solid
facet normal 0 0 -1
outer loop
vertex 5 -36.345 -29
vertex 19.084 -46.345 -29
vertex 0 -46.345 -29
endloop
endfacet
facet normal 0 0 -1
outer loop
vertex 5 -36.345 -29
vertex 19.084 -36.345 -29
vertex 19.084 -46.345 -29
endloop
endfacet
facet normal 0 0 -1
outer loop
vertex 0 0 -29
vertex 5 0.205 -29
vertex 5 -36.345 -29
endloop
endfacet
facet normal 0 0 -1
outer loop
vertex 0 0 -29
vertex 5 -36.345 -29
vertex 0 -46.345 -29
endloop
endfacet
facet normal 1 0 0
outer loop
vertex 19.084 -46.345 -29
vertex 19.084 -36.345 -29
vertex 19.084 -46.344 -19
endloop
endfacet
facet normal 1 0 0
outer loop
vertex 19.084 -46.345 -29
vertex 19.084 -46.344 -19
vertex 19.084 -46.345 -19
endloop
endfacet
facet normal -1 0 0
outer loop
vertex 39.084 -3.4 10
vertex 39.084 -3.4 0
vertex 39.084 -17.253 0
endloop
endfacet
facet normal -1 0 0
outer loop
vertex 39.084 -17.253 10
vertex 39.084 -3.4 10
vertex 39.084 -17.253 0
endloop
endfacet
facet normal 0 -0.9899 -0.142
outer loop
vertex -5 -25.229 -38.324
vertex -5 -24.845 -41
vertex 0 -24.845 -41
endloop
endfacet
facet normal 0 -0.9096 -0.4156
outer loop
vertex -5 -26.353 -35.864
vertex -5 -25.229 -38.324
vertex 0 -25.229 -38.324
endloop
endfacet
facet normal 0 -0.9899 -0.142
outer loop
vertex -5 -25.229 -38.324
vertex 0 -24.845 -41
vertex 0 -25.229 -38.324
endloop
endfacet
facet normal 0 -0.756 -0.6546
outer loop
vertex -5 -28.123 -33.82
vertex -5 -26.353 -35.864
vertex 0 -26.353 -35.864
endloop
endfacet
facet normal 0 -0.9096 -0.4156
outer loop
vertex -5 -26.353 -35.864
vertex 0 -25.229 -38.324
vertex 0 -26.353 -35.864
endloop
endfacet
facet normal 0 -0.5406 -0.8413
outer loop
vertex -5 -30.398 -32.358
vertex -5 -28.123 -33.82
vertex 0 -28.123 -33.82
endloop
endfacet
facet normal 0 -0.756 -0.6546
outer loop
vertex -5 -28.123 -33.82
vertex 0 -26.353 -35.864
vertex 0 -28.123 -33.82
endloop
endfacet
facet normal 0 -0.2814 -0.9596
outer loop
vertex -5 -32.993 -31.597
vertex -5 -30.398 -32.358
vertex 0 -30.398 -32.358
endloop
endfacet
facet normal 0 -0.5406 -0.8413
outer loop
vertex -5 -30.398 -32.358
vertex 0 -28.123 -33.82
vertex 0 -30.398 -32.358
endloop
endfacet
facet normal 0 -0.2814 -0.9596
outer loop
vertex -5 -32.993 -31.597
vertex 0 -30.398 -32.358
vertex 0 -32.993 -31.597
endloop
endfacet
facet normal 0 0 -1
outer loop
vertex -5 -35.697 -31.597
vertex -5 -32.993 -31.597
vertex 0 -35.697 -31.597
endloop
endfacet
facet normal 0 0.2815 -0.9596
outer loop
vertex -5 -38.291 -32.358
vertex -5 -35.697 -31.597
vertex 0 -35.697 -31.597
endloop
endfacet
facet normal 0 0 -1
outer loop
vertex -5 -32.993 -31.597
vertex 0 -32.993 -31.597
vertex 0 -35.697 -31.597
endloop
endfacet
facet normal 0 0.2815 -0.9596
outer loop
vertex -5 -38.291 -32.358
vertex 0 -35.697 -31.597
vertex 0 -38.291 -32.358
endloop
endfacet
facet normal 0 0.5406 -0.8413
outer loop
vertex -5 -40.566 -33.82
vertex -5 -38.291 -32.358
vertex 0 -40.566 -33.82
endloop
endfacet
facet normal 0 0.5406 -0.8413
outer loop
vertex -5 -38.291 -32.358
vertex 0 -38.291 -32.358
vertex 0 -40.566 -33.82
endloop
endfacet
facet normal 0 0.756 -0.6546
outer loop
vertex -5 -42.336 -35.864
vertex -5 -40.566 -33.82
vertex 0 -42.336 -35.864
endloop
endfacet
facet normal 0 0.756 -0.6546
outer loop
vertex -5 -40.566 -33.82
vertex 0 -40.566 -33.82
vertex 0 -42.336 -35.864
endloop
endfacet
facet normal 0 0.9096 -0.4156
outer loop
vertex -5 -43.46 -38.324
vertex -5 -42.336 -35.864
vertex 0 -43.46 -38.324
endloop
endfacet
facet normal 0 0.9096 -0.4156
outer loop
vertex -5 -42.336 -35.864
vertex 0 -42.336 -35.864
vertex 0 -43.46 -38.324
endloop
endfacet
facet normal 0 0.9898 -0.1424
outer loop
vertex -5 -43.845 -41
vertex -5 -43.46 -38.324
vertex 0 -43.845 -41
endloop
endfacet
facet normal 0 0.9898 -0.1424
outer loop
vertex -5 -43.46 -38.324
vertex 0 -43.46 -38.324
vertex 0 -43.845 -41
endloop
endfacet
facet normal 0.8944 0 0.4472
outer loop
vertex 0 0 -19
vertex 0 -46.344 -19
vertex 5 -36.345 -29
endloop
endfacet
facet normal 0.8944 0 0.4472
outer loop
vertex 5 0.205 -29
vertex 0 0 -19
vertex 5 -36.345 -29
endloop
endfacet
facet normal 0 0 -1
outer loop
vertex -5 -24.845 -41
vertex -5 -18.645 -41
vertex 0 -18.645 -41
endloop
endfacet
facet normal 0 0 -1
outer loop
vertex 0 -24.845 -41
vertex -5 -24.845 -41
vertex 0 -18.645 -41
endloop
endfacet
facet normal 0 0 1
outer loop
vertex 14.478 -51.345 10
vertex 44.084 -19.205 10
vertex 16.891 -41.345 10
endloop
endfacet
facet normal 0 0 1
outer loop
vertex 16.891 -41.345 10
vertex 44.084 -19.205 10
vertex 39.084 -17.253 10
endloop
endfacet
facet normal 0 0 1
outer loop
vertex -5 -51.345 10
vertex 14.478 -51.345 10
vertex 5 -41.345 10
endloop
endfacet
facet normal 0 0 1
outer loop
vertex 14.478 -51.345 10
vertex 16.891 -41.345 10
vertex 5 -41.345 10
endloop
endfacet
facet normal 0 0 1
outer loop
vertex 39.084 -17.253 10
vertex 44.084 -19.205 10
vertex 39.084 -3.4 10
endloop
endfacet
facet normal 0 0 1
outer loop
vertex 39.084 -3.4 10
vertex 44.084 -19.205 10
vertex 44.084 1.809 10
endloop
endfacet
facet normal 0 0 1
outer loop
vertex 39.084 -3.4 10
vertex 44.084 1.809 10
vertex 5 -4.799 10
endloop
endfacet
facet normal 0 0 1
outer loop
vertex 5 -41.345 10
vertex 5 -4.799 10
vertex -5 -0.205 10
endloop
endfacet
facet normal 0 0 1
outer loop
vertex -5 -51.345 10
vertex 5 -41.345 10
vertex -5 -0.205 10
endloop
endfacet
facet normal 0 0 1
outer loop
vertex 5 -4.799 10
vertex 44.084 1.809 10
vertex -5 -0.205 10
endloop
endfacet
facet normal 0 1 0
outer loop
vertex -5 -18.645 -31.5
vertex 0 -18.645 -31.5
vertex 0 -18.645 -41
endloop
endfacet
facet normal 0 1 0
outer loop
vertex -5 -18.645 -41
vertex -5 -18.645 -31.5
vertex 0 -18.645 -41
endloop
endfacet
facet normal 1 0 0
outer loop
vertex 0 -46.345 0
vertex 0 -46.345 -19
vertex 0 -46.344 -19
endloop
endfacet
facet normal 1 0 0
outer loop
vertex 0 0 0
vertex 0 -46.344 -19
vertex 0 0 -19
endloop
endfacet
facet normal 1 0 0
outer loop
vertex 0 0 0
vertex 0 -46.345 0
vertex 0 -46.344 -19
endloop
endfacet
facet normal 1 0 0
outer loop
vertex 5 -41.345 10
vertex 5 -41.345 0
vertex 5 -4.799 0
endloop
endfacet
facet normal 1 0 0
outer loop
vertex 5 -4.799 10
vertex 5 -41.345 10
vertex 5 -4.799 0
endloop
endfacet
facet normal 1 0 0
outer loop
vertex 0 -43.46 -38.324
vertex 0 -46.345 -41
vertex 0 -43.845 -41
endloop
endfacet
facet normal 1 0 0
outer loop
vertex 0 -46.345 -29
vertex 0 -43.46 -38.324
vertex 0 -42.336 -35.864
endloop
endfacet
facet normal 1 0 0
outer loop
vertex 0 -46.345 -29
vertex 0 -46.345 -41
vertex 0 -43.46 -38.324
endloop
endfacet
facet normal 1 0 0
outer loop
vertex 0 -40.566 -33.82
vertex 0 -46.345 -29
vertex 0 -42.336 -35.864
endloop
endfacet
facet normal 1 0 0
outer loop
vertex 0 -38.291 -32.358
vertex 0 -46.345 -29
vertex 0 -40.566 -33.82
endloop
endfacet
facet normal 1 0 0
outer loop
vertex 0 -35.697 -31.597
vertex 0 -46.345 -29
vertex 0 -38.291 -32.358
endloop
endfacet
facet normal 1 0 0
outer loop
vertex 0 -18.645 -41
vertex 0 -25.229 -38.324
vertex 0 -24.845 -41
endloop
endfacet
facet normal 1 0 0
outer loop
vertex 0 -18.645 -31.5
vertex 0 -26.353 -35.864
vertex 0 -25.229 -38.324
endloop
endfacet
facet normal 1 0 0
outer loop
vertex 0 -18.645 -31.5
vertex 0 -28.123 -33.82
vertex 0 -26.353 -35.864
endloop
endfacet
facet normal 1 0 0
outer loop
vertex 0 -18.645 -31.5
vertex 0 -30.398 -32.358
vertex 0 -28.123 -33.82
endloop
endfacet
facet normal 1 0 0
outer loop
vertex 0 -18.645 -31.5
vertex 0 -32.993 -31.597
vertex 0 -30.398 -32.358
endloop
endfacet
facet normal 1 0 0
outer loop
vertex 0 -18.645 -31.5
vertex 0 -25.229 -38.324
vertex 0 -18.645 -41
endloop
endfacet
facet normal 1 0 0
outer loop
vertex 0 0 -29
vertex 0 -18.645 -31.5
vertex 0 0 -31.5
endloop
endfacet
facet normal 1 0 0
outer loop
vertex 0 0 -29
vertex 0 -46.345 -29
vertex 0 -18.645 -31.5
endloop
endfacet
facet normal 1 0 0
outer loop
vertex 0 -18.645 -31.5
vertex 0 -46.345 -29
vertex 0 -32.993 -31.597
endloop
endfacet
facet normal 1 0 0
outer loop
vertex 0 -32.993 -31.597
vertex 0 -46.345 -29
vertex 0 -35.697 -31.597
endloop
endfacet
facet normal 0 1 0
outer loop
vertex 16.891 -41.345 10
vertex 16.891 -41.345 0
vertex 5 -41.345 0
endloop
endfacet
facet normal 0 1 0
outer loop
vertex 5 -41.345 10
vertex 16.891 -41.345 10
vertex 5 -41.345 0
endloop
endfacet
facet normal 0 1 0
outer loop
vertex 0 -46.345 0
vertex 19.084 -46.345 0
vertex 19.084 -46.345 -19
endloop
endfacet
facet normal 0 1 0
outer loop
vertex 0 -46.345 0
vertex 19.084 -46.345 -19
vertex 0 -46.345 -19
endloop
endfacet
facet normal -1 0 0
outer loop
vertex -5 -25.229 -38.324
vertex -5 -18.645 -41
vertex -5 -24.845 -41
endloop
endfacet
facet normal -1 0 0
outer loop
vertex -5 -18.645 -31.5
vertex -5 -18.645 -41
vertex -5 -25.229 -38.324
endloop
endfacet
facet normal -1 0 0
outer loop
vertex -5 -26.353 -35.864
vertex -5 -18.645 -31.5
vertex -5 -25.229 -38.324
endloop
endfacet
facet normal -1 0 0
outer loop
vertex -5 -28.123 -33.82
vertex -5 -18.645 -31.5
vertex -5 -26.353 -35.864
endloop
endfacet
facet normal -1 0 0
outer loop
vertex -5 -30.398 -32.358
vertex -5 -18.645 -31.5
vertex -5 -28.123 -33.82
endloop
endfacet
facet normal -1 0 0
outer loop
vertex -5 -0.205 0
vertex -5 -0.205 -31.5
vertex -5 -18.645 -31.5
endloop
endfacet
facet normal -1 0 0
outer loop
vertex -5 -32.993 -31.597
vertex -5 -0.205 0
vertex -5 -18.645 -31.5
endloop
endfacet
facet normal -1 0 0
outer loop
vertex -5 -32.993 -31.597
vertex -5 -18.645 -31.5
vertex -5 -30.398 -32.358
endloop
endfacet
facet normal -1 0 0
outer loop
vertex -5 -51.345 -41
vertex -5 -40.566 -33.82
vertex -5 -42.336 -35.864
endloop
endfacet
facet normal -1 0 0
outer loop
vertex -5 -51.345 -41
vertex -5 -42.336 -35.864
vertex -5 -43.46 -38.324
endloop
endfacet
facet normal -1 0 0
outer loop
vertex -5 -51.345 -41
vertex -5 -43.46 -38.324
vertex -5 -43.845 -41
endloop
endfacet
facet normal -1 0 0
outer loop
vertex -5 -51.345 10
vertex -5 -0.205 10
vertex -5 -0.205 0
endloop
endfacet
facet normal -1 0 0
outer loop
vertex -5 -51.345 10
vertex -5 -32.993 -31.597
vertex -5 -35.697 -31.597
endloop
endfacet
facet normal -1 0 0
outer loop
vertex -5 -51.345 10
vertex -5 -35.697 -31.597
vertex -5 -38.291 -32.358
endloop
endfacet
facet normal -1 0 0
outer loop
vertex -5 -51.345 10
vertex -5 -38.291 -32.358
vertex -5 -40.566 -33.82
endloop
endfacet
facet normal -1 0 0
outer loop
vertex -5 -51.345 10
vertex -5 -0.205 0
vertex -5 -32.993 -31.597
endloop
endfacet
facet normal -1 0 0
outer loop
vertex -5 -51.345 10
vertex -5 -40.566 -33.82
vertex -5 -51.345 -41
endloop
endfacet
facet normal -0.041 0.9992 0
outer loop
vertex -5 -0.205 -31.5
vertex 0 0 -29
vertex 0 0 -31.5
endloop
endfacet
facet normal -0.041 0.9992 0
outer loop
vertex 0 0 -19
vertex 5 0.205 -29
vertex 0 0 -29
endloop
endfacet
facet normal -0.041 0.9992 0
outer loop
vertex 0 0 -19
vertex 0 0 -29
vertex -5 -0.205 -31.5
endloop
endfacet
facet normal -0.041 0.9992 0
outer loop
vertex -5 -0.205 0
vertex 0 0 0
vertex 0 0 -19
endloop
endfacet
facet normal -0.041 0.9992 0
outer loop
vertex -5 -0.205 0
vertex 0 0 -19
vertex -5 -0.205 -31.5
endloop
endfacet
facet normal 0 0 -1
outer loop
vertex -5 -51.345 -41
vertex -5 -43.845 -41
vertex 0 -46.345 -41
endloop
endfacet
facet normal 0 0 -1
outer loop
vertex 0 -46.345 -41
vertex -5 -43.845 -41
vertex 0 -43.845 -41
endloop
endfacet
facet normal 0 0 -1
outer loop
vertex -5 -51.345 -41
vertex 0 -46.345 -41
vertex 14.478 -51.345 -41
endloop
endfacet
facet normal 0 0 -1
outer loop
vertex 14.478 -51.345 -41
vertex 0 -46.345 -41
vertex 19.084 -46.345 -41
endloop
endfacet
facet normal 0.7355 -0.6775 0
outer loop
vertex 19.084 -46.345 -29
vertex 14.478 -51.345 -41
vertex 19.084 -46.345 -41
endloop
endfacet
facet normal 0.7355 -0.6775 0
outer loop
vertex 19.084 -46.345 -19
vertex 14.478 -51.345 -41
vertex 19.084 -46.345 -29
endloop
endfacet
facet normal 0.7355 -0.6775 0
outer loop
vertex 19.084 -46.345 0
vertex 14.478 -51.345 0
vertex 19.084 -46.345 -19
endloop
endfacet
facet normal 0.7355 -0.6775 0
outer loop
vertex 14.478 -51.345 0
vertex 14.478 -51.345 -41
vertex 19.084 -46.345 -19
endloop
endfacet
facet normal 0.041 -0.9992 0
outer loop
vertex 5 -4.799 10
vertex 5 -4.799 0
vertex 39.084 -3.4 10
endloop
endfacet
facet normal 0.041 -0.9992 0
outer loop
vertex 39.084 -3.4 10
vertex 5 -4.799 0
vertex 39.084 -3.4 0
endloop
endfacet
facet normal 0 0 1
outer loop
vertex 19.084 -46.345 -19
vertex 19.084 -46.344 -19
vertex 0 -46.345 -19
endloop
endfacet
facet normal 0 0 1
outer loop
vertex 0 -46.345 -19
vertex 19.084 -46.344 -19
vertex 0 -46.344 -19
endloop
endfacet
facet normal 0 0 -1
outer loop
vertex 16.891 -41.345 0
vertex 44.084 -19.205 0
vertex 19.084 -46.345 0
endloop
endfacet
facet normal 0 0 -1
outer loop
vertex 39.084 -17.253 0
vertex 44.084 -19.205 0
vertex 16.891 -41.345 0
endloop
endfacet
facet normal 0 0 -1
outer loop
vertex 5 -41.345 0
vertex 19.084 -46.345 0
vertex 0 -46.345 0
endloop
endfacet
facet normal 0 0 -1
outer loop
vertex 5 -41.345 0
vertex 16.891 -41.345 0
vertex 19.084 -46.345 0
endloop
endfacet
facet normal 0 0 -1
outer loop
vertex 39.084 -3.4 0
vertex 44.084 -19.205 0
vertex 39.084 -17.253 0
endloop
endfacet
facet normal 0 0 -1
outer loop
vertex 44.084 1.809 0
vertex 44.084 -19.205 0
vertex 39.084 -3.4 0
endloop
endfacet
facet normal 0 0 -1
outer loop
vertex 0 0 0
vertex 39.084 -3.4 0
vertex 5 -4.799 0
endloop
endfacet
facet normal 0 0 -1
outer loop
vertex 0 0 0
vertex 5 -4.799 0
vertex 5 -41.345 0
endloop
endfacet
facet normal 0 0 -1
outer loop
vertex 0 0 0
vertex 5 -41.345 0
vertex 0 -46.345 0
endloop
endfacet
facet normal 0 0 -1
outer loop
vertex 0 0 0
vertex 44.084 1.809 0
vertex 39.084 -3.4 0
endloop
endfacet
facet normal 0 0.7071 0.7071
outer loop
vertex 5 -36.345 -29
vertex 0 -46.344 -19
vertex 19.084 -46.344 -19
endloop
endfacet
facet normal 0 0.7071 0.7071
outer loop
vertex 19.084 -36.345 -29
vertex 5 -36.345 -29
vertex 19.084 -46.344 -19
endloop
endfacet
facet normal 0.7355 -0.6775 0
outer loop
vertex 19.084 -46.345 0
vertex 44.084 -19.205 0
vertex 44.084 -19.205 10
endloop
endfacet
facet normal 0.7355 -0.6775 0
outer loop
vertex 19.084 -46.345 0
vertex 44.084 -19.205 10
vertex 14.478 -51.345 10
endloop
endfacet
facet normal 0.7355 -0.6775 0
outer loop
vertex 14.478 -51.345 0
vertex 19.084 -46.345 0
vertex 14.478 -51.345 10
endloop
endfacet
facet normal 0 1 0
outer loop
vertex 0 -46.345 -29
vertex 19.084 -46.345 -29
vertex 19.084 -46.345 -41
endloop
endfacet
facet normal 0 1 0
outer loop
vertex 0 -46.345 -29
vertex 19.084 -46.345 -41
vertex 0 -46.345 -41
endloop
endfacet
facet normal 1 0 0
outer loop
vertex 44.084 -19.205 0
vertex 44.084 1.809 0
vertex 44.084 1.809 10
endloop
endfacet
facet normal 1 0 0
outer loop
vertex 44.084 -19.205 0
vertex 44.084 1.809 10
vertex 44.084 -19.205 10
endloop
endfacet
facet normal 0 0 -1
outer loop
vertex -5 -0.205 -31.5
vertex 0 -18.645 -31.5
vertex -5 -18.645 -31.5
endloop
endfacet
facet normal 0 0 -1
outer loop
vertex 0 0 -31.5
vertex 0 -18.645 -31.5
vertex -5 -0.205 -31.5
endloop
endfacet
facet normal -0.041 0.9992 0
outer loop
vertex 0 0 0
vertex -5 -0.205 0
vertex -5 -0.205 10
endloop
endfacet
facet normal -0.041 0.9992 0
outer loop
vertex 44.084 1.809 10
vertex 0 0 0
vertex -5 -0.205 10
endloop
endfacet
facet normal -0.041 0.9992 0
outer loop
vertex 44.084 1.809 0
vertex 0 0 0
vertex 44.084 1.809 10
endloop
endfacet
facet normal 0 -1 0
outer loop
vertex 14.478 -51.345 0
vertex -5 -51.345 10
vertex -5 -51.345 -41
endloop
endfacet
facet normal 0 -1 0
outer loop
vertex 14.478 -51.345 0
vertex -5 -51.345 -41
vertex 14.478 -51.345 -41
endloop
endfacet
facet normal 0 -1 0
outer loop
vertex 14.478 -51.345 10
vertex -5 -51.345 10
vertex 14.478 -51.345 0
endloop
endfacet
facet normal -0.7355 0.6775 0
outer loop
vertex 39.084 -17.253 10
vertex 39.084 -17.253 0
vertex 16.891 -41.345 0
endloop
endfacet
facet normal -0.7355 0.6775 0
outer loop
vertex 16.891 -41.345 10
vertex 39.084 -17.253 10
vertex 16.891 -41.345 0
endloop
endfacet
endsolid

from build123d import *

# Parameters (mm, degrees)
BOSS_EXTRUDE1_DEPTH = 10
BOSS_EXTRUDE6_DEPTH = 41
CUT_EXTRUDE1_REACH  = 81.124
SKETCH6_R           = 9.5
SKETCH6_W           = 9.5
SKETCH6_H           = 18.644559606
CUT_EXTRUDE2_REACH  = 81.124
BOSS_EXTRUDE9_DEPTH = 10
CHAMFER2_SIZE       = 5
CHAMFER2_SIZE_2     = 10
CHAMFER3_SIZE       = 10


# Some blends are built 0.0001 mm under size
with BuildPart() as part:
    # Sketch2 → Boss-Extrude1 (new body)
    with BuildSketch(Plane.XY):
        Polygon((-5, -51.344559606), (-5, -0.20517252), (44.083730464, 1.808954014), (44.083730464, -19.205040291), (14.477900916, -51.344559606), align=None)
    extrude(amount=BOSS_EXTRUDE1_DEPTH)

    # Sketch2<5> → Boss-Extrude6 (add)
    with BuildSketch(Plane.XY):
        Polygon((-5, -0.20517252), (-5, -51.344559606), (14.477900916, -51.344559606), (19.083730464, -46.344559606), (0, -46.344559606), (0, 0), align=None)
    extrude(amount=-BOSS_EXTRUDE6_DEPTH)

    # Sketch6 → Cut-Extrude1 (cut, up to next)
    with BuildSketch(Plane(origin=(0, 0, 0), x_dir=(0, 0, -1), z_dir=(1, 0, 0)), mode=Mode.PRIVATE) as cut_extrude1_sk1:
        with Locations((41, -34.344559606)):
            Circle(SKETCH6_R)
    cut_extrude1_tool1 = extrude(cut_extrude1_sk1.sketch, amount=-CUT_EXTRUDE1_REACH, mode=Mode.PRIVATE) & part.part
    # Sketch6 → Cut-Extrude1 (cut, up to next)
    with BuildSketch(Plane(origin=(0, 0, 0), x_dir=(0, 0, -1), z_dir=(1, 0, 0)), mode=Mode.PRIVATE) as cut_extrude1_sk2:
        with Locations((36.25, -9.322279803)):
            Rectangle(SKETCH6_W, SKETCH6_H)
    cut_extrude1_tool2 = extrude(cut_extrude1_sk2.sketch, amount=-CUT_EXTRUDE1_REACH, mode=Mode.PRIVATE) & part.part
    add(cut_extrude1_tool1.solids().sort_by_distance((0, -34.34456, -41))[0], mode=Mode.SUBTRACT)
    add(cut_extrude1_tool2.solids().sort_by_distance((0, -9.32228, -36.25))[0], mode=Mode.SUBTRACT)

    # Sketch7 → Cut-Extrude2 (cut, up to next)
    with BuildSketch(Plane(origin=(0, 0, 0), x_dir=(-1, 0, 0), z_dir=(0, 0, -1)), mode=Mode.PRIVATE) as cut_extrude2_sk1:
        Polygon((-39.083730464, -17.253097249), (-16.891496625, -41.344559606), (-5, -41.344559606), (-5, -4.799035286), (-39.083730464, -3.400426311), align=None)
    cut_extrude2_tool1 = extrude(cut_extrude2_sk1.sketch, amount=-CUT_EXTRUDE2_REACH, mode=Mode.PRIVATE) & part.part
    add(cut_extrude2_tool1.solids().sort_by_distance((19.604261, -19.893914, 0))[0], mode=Mode.SUBTRACT)

    # Sketch10 → Boss-Extrude9 (add)
    with BuildSketch(Plane.XY.offset(-29)):
        Polygon((19.083730464, -46.344559606), (0, -46.344559606), (0, 0), (5, 0.20517252), (5, -36.344559606), (19.083730464, -36.344559606), align=None)
    extrude(amount=BOSS_EXTRUDE9_DEPTH)

    # Chamfer2
    # the kernel refuses this chamfer: 10, 5 mm, written as the material it takes off along each edge
    with BuildSketch(Plane(origin=(5, 26.103461258, -19), x_dir=(-0.9976223042390326, 0, 0.0689183436017091), z_dir=(0, -1, 0))) as chamfer2_piece_1:
        Polygon((CHAMFER2_SIZE * 0.997622304239, CHAMFER2_SIZE * 0.0689183436017), (-CHAMFER2_SIZE_2 * 0.0689183436017, CHAMFER2_SIZE_2 * 0.997622304239), (0, 0), align=None)
    extrude(amount=62.448020863, mode=Mode.SUBTRACT)

    # Chamfer3
    chamfer3_edges = [part.edges().sort_by_distance(p)[0] for p in [
        (9.541865232, -36.344559606, -19),
    ]]
    chamfer(chamfer3_edges, length=CHAMFER3_SIZE - 0.0001)  # a hair under: the kernel refuses the full size


solid = part.part
